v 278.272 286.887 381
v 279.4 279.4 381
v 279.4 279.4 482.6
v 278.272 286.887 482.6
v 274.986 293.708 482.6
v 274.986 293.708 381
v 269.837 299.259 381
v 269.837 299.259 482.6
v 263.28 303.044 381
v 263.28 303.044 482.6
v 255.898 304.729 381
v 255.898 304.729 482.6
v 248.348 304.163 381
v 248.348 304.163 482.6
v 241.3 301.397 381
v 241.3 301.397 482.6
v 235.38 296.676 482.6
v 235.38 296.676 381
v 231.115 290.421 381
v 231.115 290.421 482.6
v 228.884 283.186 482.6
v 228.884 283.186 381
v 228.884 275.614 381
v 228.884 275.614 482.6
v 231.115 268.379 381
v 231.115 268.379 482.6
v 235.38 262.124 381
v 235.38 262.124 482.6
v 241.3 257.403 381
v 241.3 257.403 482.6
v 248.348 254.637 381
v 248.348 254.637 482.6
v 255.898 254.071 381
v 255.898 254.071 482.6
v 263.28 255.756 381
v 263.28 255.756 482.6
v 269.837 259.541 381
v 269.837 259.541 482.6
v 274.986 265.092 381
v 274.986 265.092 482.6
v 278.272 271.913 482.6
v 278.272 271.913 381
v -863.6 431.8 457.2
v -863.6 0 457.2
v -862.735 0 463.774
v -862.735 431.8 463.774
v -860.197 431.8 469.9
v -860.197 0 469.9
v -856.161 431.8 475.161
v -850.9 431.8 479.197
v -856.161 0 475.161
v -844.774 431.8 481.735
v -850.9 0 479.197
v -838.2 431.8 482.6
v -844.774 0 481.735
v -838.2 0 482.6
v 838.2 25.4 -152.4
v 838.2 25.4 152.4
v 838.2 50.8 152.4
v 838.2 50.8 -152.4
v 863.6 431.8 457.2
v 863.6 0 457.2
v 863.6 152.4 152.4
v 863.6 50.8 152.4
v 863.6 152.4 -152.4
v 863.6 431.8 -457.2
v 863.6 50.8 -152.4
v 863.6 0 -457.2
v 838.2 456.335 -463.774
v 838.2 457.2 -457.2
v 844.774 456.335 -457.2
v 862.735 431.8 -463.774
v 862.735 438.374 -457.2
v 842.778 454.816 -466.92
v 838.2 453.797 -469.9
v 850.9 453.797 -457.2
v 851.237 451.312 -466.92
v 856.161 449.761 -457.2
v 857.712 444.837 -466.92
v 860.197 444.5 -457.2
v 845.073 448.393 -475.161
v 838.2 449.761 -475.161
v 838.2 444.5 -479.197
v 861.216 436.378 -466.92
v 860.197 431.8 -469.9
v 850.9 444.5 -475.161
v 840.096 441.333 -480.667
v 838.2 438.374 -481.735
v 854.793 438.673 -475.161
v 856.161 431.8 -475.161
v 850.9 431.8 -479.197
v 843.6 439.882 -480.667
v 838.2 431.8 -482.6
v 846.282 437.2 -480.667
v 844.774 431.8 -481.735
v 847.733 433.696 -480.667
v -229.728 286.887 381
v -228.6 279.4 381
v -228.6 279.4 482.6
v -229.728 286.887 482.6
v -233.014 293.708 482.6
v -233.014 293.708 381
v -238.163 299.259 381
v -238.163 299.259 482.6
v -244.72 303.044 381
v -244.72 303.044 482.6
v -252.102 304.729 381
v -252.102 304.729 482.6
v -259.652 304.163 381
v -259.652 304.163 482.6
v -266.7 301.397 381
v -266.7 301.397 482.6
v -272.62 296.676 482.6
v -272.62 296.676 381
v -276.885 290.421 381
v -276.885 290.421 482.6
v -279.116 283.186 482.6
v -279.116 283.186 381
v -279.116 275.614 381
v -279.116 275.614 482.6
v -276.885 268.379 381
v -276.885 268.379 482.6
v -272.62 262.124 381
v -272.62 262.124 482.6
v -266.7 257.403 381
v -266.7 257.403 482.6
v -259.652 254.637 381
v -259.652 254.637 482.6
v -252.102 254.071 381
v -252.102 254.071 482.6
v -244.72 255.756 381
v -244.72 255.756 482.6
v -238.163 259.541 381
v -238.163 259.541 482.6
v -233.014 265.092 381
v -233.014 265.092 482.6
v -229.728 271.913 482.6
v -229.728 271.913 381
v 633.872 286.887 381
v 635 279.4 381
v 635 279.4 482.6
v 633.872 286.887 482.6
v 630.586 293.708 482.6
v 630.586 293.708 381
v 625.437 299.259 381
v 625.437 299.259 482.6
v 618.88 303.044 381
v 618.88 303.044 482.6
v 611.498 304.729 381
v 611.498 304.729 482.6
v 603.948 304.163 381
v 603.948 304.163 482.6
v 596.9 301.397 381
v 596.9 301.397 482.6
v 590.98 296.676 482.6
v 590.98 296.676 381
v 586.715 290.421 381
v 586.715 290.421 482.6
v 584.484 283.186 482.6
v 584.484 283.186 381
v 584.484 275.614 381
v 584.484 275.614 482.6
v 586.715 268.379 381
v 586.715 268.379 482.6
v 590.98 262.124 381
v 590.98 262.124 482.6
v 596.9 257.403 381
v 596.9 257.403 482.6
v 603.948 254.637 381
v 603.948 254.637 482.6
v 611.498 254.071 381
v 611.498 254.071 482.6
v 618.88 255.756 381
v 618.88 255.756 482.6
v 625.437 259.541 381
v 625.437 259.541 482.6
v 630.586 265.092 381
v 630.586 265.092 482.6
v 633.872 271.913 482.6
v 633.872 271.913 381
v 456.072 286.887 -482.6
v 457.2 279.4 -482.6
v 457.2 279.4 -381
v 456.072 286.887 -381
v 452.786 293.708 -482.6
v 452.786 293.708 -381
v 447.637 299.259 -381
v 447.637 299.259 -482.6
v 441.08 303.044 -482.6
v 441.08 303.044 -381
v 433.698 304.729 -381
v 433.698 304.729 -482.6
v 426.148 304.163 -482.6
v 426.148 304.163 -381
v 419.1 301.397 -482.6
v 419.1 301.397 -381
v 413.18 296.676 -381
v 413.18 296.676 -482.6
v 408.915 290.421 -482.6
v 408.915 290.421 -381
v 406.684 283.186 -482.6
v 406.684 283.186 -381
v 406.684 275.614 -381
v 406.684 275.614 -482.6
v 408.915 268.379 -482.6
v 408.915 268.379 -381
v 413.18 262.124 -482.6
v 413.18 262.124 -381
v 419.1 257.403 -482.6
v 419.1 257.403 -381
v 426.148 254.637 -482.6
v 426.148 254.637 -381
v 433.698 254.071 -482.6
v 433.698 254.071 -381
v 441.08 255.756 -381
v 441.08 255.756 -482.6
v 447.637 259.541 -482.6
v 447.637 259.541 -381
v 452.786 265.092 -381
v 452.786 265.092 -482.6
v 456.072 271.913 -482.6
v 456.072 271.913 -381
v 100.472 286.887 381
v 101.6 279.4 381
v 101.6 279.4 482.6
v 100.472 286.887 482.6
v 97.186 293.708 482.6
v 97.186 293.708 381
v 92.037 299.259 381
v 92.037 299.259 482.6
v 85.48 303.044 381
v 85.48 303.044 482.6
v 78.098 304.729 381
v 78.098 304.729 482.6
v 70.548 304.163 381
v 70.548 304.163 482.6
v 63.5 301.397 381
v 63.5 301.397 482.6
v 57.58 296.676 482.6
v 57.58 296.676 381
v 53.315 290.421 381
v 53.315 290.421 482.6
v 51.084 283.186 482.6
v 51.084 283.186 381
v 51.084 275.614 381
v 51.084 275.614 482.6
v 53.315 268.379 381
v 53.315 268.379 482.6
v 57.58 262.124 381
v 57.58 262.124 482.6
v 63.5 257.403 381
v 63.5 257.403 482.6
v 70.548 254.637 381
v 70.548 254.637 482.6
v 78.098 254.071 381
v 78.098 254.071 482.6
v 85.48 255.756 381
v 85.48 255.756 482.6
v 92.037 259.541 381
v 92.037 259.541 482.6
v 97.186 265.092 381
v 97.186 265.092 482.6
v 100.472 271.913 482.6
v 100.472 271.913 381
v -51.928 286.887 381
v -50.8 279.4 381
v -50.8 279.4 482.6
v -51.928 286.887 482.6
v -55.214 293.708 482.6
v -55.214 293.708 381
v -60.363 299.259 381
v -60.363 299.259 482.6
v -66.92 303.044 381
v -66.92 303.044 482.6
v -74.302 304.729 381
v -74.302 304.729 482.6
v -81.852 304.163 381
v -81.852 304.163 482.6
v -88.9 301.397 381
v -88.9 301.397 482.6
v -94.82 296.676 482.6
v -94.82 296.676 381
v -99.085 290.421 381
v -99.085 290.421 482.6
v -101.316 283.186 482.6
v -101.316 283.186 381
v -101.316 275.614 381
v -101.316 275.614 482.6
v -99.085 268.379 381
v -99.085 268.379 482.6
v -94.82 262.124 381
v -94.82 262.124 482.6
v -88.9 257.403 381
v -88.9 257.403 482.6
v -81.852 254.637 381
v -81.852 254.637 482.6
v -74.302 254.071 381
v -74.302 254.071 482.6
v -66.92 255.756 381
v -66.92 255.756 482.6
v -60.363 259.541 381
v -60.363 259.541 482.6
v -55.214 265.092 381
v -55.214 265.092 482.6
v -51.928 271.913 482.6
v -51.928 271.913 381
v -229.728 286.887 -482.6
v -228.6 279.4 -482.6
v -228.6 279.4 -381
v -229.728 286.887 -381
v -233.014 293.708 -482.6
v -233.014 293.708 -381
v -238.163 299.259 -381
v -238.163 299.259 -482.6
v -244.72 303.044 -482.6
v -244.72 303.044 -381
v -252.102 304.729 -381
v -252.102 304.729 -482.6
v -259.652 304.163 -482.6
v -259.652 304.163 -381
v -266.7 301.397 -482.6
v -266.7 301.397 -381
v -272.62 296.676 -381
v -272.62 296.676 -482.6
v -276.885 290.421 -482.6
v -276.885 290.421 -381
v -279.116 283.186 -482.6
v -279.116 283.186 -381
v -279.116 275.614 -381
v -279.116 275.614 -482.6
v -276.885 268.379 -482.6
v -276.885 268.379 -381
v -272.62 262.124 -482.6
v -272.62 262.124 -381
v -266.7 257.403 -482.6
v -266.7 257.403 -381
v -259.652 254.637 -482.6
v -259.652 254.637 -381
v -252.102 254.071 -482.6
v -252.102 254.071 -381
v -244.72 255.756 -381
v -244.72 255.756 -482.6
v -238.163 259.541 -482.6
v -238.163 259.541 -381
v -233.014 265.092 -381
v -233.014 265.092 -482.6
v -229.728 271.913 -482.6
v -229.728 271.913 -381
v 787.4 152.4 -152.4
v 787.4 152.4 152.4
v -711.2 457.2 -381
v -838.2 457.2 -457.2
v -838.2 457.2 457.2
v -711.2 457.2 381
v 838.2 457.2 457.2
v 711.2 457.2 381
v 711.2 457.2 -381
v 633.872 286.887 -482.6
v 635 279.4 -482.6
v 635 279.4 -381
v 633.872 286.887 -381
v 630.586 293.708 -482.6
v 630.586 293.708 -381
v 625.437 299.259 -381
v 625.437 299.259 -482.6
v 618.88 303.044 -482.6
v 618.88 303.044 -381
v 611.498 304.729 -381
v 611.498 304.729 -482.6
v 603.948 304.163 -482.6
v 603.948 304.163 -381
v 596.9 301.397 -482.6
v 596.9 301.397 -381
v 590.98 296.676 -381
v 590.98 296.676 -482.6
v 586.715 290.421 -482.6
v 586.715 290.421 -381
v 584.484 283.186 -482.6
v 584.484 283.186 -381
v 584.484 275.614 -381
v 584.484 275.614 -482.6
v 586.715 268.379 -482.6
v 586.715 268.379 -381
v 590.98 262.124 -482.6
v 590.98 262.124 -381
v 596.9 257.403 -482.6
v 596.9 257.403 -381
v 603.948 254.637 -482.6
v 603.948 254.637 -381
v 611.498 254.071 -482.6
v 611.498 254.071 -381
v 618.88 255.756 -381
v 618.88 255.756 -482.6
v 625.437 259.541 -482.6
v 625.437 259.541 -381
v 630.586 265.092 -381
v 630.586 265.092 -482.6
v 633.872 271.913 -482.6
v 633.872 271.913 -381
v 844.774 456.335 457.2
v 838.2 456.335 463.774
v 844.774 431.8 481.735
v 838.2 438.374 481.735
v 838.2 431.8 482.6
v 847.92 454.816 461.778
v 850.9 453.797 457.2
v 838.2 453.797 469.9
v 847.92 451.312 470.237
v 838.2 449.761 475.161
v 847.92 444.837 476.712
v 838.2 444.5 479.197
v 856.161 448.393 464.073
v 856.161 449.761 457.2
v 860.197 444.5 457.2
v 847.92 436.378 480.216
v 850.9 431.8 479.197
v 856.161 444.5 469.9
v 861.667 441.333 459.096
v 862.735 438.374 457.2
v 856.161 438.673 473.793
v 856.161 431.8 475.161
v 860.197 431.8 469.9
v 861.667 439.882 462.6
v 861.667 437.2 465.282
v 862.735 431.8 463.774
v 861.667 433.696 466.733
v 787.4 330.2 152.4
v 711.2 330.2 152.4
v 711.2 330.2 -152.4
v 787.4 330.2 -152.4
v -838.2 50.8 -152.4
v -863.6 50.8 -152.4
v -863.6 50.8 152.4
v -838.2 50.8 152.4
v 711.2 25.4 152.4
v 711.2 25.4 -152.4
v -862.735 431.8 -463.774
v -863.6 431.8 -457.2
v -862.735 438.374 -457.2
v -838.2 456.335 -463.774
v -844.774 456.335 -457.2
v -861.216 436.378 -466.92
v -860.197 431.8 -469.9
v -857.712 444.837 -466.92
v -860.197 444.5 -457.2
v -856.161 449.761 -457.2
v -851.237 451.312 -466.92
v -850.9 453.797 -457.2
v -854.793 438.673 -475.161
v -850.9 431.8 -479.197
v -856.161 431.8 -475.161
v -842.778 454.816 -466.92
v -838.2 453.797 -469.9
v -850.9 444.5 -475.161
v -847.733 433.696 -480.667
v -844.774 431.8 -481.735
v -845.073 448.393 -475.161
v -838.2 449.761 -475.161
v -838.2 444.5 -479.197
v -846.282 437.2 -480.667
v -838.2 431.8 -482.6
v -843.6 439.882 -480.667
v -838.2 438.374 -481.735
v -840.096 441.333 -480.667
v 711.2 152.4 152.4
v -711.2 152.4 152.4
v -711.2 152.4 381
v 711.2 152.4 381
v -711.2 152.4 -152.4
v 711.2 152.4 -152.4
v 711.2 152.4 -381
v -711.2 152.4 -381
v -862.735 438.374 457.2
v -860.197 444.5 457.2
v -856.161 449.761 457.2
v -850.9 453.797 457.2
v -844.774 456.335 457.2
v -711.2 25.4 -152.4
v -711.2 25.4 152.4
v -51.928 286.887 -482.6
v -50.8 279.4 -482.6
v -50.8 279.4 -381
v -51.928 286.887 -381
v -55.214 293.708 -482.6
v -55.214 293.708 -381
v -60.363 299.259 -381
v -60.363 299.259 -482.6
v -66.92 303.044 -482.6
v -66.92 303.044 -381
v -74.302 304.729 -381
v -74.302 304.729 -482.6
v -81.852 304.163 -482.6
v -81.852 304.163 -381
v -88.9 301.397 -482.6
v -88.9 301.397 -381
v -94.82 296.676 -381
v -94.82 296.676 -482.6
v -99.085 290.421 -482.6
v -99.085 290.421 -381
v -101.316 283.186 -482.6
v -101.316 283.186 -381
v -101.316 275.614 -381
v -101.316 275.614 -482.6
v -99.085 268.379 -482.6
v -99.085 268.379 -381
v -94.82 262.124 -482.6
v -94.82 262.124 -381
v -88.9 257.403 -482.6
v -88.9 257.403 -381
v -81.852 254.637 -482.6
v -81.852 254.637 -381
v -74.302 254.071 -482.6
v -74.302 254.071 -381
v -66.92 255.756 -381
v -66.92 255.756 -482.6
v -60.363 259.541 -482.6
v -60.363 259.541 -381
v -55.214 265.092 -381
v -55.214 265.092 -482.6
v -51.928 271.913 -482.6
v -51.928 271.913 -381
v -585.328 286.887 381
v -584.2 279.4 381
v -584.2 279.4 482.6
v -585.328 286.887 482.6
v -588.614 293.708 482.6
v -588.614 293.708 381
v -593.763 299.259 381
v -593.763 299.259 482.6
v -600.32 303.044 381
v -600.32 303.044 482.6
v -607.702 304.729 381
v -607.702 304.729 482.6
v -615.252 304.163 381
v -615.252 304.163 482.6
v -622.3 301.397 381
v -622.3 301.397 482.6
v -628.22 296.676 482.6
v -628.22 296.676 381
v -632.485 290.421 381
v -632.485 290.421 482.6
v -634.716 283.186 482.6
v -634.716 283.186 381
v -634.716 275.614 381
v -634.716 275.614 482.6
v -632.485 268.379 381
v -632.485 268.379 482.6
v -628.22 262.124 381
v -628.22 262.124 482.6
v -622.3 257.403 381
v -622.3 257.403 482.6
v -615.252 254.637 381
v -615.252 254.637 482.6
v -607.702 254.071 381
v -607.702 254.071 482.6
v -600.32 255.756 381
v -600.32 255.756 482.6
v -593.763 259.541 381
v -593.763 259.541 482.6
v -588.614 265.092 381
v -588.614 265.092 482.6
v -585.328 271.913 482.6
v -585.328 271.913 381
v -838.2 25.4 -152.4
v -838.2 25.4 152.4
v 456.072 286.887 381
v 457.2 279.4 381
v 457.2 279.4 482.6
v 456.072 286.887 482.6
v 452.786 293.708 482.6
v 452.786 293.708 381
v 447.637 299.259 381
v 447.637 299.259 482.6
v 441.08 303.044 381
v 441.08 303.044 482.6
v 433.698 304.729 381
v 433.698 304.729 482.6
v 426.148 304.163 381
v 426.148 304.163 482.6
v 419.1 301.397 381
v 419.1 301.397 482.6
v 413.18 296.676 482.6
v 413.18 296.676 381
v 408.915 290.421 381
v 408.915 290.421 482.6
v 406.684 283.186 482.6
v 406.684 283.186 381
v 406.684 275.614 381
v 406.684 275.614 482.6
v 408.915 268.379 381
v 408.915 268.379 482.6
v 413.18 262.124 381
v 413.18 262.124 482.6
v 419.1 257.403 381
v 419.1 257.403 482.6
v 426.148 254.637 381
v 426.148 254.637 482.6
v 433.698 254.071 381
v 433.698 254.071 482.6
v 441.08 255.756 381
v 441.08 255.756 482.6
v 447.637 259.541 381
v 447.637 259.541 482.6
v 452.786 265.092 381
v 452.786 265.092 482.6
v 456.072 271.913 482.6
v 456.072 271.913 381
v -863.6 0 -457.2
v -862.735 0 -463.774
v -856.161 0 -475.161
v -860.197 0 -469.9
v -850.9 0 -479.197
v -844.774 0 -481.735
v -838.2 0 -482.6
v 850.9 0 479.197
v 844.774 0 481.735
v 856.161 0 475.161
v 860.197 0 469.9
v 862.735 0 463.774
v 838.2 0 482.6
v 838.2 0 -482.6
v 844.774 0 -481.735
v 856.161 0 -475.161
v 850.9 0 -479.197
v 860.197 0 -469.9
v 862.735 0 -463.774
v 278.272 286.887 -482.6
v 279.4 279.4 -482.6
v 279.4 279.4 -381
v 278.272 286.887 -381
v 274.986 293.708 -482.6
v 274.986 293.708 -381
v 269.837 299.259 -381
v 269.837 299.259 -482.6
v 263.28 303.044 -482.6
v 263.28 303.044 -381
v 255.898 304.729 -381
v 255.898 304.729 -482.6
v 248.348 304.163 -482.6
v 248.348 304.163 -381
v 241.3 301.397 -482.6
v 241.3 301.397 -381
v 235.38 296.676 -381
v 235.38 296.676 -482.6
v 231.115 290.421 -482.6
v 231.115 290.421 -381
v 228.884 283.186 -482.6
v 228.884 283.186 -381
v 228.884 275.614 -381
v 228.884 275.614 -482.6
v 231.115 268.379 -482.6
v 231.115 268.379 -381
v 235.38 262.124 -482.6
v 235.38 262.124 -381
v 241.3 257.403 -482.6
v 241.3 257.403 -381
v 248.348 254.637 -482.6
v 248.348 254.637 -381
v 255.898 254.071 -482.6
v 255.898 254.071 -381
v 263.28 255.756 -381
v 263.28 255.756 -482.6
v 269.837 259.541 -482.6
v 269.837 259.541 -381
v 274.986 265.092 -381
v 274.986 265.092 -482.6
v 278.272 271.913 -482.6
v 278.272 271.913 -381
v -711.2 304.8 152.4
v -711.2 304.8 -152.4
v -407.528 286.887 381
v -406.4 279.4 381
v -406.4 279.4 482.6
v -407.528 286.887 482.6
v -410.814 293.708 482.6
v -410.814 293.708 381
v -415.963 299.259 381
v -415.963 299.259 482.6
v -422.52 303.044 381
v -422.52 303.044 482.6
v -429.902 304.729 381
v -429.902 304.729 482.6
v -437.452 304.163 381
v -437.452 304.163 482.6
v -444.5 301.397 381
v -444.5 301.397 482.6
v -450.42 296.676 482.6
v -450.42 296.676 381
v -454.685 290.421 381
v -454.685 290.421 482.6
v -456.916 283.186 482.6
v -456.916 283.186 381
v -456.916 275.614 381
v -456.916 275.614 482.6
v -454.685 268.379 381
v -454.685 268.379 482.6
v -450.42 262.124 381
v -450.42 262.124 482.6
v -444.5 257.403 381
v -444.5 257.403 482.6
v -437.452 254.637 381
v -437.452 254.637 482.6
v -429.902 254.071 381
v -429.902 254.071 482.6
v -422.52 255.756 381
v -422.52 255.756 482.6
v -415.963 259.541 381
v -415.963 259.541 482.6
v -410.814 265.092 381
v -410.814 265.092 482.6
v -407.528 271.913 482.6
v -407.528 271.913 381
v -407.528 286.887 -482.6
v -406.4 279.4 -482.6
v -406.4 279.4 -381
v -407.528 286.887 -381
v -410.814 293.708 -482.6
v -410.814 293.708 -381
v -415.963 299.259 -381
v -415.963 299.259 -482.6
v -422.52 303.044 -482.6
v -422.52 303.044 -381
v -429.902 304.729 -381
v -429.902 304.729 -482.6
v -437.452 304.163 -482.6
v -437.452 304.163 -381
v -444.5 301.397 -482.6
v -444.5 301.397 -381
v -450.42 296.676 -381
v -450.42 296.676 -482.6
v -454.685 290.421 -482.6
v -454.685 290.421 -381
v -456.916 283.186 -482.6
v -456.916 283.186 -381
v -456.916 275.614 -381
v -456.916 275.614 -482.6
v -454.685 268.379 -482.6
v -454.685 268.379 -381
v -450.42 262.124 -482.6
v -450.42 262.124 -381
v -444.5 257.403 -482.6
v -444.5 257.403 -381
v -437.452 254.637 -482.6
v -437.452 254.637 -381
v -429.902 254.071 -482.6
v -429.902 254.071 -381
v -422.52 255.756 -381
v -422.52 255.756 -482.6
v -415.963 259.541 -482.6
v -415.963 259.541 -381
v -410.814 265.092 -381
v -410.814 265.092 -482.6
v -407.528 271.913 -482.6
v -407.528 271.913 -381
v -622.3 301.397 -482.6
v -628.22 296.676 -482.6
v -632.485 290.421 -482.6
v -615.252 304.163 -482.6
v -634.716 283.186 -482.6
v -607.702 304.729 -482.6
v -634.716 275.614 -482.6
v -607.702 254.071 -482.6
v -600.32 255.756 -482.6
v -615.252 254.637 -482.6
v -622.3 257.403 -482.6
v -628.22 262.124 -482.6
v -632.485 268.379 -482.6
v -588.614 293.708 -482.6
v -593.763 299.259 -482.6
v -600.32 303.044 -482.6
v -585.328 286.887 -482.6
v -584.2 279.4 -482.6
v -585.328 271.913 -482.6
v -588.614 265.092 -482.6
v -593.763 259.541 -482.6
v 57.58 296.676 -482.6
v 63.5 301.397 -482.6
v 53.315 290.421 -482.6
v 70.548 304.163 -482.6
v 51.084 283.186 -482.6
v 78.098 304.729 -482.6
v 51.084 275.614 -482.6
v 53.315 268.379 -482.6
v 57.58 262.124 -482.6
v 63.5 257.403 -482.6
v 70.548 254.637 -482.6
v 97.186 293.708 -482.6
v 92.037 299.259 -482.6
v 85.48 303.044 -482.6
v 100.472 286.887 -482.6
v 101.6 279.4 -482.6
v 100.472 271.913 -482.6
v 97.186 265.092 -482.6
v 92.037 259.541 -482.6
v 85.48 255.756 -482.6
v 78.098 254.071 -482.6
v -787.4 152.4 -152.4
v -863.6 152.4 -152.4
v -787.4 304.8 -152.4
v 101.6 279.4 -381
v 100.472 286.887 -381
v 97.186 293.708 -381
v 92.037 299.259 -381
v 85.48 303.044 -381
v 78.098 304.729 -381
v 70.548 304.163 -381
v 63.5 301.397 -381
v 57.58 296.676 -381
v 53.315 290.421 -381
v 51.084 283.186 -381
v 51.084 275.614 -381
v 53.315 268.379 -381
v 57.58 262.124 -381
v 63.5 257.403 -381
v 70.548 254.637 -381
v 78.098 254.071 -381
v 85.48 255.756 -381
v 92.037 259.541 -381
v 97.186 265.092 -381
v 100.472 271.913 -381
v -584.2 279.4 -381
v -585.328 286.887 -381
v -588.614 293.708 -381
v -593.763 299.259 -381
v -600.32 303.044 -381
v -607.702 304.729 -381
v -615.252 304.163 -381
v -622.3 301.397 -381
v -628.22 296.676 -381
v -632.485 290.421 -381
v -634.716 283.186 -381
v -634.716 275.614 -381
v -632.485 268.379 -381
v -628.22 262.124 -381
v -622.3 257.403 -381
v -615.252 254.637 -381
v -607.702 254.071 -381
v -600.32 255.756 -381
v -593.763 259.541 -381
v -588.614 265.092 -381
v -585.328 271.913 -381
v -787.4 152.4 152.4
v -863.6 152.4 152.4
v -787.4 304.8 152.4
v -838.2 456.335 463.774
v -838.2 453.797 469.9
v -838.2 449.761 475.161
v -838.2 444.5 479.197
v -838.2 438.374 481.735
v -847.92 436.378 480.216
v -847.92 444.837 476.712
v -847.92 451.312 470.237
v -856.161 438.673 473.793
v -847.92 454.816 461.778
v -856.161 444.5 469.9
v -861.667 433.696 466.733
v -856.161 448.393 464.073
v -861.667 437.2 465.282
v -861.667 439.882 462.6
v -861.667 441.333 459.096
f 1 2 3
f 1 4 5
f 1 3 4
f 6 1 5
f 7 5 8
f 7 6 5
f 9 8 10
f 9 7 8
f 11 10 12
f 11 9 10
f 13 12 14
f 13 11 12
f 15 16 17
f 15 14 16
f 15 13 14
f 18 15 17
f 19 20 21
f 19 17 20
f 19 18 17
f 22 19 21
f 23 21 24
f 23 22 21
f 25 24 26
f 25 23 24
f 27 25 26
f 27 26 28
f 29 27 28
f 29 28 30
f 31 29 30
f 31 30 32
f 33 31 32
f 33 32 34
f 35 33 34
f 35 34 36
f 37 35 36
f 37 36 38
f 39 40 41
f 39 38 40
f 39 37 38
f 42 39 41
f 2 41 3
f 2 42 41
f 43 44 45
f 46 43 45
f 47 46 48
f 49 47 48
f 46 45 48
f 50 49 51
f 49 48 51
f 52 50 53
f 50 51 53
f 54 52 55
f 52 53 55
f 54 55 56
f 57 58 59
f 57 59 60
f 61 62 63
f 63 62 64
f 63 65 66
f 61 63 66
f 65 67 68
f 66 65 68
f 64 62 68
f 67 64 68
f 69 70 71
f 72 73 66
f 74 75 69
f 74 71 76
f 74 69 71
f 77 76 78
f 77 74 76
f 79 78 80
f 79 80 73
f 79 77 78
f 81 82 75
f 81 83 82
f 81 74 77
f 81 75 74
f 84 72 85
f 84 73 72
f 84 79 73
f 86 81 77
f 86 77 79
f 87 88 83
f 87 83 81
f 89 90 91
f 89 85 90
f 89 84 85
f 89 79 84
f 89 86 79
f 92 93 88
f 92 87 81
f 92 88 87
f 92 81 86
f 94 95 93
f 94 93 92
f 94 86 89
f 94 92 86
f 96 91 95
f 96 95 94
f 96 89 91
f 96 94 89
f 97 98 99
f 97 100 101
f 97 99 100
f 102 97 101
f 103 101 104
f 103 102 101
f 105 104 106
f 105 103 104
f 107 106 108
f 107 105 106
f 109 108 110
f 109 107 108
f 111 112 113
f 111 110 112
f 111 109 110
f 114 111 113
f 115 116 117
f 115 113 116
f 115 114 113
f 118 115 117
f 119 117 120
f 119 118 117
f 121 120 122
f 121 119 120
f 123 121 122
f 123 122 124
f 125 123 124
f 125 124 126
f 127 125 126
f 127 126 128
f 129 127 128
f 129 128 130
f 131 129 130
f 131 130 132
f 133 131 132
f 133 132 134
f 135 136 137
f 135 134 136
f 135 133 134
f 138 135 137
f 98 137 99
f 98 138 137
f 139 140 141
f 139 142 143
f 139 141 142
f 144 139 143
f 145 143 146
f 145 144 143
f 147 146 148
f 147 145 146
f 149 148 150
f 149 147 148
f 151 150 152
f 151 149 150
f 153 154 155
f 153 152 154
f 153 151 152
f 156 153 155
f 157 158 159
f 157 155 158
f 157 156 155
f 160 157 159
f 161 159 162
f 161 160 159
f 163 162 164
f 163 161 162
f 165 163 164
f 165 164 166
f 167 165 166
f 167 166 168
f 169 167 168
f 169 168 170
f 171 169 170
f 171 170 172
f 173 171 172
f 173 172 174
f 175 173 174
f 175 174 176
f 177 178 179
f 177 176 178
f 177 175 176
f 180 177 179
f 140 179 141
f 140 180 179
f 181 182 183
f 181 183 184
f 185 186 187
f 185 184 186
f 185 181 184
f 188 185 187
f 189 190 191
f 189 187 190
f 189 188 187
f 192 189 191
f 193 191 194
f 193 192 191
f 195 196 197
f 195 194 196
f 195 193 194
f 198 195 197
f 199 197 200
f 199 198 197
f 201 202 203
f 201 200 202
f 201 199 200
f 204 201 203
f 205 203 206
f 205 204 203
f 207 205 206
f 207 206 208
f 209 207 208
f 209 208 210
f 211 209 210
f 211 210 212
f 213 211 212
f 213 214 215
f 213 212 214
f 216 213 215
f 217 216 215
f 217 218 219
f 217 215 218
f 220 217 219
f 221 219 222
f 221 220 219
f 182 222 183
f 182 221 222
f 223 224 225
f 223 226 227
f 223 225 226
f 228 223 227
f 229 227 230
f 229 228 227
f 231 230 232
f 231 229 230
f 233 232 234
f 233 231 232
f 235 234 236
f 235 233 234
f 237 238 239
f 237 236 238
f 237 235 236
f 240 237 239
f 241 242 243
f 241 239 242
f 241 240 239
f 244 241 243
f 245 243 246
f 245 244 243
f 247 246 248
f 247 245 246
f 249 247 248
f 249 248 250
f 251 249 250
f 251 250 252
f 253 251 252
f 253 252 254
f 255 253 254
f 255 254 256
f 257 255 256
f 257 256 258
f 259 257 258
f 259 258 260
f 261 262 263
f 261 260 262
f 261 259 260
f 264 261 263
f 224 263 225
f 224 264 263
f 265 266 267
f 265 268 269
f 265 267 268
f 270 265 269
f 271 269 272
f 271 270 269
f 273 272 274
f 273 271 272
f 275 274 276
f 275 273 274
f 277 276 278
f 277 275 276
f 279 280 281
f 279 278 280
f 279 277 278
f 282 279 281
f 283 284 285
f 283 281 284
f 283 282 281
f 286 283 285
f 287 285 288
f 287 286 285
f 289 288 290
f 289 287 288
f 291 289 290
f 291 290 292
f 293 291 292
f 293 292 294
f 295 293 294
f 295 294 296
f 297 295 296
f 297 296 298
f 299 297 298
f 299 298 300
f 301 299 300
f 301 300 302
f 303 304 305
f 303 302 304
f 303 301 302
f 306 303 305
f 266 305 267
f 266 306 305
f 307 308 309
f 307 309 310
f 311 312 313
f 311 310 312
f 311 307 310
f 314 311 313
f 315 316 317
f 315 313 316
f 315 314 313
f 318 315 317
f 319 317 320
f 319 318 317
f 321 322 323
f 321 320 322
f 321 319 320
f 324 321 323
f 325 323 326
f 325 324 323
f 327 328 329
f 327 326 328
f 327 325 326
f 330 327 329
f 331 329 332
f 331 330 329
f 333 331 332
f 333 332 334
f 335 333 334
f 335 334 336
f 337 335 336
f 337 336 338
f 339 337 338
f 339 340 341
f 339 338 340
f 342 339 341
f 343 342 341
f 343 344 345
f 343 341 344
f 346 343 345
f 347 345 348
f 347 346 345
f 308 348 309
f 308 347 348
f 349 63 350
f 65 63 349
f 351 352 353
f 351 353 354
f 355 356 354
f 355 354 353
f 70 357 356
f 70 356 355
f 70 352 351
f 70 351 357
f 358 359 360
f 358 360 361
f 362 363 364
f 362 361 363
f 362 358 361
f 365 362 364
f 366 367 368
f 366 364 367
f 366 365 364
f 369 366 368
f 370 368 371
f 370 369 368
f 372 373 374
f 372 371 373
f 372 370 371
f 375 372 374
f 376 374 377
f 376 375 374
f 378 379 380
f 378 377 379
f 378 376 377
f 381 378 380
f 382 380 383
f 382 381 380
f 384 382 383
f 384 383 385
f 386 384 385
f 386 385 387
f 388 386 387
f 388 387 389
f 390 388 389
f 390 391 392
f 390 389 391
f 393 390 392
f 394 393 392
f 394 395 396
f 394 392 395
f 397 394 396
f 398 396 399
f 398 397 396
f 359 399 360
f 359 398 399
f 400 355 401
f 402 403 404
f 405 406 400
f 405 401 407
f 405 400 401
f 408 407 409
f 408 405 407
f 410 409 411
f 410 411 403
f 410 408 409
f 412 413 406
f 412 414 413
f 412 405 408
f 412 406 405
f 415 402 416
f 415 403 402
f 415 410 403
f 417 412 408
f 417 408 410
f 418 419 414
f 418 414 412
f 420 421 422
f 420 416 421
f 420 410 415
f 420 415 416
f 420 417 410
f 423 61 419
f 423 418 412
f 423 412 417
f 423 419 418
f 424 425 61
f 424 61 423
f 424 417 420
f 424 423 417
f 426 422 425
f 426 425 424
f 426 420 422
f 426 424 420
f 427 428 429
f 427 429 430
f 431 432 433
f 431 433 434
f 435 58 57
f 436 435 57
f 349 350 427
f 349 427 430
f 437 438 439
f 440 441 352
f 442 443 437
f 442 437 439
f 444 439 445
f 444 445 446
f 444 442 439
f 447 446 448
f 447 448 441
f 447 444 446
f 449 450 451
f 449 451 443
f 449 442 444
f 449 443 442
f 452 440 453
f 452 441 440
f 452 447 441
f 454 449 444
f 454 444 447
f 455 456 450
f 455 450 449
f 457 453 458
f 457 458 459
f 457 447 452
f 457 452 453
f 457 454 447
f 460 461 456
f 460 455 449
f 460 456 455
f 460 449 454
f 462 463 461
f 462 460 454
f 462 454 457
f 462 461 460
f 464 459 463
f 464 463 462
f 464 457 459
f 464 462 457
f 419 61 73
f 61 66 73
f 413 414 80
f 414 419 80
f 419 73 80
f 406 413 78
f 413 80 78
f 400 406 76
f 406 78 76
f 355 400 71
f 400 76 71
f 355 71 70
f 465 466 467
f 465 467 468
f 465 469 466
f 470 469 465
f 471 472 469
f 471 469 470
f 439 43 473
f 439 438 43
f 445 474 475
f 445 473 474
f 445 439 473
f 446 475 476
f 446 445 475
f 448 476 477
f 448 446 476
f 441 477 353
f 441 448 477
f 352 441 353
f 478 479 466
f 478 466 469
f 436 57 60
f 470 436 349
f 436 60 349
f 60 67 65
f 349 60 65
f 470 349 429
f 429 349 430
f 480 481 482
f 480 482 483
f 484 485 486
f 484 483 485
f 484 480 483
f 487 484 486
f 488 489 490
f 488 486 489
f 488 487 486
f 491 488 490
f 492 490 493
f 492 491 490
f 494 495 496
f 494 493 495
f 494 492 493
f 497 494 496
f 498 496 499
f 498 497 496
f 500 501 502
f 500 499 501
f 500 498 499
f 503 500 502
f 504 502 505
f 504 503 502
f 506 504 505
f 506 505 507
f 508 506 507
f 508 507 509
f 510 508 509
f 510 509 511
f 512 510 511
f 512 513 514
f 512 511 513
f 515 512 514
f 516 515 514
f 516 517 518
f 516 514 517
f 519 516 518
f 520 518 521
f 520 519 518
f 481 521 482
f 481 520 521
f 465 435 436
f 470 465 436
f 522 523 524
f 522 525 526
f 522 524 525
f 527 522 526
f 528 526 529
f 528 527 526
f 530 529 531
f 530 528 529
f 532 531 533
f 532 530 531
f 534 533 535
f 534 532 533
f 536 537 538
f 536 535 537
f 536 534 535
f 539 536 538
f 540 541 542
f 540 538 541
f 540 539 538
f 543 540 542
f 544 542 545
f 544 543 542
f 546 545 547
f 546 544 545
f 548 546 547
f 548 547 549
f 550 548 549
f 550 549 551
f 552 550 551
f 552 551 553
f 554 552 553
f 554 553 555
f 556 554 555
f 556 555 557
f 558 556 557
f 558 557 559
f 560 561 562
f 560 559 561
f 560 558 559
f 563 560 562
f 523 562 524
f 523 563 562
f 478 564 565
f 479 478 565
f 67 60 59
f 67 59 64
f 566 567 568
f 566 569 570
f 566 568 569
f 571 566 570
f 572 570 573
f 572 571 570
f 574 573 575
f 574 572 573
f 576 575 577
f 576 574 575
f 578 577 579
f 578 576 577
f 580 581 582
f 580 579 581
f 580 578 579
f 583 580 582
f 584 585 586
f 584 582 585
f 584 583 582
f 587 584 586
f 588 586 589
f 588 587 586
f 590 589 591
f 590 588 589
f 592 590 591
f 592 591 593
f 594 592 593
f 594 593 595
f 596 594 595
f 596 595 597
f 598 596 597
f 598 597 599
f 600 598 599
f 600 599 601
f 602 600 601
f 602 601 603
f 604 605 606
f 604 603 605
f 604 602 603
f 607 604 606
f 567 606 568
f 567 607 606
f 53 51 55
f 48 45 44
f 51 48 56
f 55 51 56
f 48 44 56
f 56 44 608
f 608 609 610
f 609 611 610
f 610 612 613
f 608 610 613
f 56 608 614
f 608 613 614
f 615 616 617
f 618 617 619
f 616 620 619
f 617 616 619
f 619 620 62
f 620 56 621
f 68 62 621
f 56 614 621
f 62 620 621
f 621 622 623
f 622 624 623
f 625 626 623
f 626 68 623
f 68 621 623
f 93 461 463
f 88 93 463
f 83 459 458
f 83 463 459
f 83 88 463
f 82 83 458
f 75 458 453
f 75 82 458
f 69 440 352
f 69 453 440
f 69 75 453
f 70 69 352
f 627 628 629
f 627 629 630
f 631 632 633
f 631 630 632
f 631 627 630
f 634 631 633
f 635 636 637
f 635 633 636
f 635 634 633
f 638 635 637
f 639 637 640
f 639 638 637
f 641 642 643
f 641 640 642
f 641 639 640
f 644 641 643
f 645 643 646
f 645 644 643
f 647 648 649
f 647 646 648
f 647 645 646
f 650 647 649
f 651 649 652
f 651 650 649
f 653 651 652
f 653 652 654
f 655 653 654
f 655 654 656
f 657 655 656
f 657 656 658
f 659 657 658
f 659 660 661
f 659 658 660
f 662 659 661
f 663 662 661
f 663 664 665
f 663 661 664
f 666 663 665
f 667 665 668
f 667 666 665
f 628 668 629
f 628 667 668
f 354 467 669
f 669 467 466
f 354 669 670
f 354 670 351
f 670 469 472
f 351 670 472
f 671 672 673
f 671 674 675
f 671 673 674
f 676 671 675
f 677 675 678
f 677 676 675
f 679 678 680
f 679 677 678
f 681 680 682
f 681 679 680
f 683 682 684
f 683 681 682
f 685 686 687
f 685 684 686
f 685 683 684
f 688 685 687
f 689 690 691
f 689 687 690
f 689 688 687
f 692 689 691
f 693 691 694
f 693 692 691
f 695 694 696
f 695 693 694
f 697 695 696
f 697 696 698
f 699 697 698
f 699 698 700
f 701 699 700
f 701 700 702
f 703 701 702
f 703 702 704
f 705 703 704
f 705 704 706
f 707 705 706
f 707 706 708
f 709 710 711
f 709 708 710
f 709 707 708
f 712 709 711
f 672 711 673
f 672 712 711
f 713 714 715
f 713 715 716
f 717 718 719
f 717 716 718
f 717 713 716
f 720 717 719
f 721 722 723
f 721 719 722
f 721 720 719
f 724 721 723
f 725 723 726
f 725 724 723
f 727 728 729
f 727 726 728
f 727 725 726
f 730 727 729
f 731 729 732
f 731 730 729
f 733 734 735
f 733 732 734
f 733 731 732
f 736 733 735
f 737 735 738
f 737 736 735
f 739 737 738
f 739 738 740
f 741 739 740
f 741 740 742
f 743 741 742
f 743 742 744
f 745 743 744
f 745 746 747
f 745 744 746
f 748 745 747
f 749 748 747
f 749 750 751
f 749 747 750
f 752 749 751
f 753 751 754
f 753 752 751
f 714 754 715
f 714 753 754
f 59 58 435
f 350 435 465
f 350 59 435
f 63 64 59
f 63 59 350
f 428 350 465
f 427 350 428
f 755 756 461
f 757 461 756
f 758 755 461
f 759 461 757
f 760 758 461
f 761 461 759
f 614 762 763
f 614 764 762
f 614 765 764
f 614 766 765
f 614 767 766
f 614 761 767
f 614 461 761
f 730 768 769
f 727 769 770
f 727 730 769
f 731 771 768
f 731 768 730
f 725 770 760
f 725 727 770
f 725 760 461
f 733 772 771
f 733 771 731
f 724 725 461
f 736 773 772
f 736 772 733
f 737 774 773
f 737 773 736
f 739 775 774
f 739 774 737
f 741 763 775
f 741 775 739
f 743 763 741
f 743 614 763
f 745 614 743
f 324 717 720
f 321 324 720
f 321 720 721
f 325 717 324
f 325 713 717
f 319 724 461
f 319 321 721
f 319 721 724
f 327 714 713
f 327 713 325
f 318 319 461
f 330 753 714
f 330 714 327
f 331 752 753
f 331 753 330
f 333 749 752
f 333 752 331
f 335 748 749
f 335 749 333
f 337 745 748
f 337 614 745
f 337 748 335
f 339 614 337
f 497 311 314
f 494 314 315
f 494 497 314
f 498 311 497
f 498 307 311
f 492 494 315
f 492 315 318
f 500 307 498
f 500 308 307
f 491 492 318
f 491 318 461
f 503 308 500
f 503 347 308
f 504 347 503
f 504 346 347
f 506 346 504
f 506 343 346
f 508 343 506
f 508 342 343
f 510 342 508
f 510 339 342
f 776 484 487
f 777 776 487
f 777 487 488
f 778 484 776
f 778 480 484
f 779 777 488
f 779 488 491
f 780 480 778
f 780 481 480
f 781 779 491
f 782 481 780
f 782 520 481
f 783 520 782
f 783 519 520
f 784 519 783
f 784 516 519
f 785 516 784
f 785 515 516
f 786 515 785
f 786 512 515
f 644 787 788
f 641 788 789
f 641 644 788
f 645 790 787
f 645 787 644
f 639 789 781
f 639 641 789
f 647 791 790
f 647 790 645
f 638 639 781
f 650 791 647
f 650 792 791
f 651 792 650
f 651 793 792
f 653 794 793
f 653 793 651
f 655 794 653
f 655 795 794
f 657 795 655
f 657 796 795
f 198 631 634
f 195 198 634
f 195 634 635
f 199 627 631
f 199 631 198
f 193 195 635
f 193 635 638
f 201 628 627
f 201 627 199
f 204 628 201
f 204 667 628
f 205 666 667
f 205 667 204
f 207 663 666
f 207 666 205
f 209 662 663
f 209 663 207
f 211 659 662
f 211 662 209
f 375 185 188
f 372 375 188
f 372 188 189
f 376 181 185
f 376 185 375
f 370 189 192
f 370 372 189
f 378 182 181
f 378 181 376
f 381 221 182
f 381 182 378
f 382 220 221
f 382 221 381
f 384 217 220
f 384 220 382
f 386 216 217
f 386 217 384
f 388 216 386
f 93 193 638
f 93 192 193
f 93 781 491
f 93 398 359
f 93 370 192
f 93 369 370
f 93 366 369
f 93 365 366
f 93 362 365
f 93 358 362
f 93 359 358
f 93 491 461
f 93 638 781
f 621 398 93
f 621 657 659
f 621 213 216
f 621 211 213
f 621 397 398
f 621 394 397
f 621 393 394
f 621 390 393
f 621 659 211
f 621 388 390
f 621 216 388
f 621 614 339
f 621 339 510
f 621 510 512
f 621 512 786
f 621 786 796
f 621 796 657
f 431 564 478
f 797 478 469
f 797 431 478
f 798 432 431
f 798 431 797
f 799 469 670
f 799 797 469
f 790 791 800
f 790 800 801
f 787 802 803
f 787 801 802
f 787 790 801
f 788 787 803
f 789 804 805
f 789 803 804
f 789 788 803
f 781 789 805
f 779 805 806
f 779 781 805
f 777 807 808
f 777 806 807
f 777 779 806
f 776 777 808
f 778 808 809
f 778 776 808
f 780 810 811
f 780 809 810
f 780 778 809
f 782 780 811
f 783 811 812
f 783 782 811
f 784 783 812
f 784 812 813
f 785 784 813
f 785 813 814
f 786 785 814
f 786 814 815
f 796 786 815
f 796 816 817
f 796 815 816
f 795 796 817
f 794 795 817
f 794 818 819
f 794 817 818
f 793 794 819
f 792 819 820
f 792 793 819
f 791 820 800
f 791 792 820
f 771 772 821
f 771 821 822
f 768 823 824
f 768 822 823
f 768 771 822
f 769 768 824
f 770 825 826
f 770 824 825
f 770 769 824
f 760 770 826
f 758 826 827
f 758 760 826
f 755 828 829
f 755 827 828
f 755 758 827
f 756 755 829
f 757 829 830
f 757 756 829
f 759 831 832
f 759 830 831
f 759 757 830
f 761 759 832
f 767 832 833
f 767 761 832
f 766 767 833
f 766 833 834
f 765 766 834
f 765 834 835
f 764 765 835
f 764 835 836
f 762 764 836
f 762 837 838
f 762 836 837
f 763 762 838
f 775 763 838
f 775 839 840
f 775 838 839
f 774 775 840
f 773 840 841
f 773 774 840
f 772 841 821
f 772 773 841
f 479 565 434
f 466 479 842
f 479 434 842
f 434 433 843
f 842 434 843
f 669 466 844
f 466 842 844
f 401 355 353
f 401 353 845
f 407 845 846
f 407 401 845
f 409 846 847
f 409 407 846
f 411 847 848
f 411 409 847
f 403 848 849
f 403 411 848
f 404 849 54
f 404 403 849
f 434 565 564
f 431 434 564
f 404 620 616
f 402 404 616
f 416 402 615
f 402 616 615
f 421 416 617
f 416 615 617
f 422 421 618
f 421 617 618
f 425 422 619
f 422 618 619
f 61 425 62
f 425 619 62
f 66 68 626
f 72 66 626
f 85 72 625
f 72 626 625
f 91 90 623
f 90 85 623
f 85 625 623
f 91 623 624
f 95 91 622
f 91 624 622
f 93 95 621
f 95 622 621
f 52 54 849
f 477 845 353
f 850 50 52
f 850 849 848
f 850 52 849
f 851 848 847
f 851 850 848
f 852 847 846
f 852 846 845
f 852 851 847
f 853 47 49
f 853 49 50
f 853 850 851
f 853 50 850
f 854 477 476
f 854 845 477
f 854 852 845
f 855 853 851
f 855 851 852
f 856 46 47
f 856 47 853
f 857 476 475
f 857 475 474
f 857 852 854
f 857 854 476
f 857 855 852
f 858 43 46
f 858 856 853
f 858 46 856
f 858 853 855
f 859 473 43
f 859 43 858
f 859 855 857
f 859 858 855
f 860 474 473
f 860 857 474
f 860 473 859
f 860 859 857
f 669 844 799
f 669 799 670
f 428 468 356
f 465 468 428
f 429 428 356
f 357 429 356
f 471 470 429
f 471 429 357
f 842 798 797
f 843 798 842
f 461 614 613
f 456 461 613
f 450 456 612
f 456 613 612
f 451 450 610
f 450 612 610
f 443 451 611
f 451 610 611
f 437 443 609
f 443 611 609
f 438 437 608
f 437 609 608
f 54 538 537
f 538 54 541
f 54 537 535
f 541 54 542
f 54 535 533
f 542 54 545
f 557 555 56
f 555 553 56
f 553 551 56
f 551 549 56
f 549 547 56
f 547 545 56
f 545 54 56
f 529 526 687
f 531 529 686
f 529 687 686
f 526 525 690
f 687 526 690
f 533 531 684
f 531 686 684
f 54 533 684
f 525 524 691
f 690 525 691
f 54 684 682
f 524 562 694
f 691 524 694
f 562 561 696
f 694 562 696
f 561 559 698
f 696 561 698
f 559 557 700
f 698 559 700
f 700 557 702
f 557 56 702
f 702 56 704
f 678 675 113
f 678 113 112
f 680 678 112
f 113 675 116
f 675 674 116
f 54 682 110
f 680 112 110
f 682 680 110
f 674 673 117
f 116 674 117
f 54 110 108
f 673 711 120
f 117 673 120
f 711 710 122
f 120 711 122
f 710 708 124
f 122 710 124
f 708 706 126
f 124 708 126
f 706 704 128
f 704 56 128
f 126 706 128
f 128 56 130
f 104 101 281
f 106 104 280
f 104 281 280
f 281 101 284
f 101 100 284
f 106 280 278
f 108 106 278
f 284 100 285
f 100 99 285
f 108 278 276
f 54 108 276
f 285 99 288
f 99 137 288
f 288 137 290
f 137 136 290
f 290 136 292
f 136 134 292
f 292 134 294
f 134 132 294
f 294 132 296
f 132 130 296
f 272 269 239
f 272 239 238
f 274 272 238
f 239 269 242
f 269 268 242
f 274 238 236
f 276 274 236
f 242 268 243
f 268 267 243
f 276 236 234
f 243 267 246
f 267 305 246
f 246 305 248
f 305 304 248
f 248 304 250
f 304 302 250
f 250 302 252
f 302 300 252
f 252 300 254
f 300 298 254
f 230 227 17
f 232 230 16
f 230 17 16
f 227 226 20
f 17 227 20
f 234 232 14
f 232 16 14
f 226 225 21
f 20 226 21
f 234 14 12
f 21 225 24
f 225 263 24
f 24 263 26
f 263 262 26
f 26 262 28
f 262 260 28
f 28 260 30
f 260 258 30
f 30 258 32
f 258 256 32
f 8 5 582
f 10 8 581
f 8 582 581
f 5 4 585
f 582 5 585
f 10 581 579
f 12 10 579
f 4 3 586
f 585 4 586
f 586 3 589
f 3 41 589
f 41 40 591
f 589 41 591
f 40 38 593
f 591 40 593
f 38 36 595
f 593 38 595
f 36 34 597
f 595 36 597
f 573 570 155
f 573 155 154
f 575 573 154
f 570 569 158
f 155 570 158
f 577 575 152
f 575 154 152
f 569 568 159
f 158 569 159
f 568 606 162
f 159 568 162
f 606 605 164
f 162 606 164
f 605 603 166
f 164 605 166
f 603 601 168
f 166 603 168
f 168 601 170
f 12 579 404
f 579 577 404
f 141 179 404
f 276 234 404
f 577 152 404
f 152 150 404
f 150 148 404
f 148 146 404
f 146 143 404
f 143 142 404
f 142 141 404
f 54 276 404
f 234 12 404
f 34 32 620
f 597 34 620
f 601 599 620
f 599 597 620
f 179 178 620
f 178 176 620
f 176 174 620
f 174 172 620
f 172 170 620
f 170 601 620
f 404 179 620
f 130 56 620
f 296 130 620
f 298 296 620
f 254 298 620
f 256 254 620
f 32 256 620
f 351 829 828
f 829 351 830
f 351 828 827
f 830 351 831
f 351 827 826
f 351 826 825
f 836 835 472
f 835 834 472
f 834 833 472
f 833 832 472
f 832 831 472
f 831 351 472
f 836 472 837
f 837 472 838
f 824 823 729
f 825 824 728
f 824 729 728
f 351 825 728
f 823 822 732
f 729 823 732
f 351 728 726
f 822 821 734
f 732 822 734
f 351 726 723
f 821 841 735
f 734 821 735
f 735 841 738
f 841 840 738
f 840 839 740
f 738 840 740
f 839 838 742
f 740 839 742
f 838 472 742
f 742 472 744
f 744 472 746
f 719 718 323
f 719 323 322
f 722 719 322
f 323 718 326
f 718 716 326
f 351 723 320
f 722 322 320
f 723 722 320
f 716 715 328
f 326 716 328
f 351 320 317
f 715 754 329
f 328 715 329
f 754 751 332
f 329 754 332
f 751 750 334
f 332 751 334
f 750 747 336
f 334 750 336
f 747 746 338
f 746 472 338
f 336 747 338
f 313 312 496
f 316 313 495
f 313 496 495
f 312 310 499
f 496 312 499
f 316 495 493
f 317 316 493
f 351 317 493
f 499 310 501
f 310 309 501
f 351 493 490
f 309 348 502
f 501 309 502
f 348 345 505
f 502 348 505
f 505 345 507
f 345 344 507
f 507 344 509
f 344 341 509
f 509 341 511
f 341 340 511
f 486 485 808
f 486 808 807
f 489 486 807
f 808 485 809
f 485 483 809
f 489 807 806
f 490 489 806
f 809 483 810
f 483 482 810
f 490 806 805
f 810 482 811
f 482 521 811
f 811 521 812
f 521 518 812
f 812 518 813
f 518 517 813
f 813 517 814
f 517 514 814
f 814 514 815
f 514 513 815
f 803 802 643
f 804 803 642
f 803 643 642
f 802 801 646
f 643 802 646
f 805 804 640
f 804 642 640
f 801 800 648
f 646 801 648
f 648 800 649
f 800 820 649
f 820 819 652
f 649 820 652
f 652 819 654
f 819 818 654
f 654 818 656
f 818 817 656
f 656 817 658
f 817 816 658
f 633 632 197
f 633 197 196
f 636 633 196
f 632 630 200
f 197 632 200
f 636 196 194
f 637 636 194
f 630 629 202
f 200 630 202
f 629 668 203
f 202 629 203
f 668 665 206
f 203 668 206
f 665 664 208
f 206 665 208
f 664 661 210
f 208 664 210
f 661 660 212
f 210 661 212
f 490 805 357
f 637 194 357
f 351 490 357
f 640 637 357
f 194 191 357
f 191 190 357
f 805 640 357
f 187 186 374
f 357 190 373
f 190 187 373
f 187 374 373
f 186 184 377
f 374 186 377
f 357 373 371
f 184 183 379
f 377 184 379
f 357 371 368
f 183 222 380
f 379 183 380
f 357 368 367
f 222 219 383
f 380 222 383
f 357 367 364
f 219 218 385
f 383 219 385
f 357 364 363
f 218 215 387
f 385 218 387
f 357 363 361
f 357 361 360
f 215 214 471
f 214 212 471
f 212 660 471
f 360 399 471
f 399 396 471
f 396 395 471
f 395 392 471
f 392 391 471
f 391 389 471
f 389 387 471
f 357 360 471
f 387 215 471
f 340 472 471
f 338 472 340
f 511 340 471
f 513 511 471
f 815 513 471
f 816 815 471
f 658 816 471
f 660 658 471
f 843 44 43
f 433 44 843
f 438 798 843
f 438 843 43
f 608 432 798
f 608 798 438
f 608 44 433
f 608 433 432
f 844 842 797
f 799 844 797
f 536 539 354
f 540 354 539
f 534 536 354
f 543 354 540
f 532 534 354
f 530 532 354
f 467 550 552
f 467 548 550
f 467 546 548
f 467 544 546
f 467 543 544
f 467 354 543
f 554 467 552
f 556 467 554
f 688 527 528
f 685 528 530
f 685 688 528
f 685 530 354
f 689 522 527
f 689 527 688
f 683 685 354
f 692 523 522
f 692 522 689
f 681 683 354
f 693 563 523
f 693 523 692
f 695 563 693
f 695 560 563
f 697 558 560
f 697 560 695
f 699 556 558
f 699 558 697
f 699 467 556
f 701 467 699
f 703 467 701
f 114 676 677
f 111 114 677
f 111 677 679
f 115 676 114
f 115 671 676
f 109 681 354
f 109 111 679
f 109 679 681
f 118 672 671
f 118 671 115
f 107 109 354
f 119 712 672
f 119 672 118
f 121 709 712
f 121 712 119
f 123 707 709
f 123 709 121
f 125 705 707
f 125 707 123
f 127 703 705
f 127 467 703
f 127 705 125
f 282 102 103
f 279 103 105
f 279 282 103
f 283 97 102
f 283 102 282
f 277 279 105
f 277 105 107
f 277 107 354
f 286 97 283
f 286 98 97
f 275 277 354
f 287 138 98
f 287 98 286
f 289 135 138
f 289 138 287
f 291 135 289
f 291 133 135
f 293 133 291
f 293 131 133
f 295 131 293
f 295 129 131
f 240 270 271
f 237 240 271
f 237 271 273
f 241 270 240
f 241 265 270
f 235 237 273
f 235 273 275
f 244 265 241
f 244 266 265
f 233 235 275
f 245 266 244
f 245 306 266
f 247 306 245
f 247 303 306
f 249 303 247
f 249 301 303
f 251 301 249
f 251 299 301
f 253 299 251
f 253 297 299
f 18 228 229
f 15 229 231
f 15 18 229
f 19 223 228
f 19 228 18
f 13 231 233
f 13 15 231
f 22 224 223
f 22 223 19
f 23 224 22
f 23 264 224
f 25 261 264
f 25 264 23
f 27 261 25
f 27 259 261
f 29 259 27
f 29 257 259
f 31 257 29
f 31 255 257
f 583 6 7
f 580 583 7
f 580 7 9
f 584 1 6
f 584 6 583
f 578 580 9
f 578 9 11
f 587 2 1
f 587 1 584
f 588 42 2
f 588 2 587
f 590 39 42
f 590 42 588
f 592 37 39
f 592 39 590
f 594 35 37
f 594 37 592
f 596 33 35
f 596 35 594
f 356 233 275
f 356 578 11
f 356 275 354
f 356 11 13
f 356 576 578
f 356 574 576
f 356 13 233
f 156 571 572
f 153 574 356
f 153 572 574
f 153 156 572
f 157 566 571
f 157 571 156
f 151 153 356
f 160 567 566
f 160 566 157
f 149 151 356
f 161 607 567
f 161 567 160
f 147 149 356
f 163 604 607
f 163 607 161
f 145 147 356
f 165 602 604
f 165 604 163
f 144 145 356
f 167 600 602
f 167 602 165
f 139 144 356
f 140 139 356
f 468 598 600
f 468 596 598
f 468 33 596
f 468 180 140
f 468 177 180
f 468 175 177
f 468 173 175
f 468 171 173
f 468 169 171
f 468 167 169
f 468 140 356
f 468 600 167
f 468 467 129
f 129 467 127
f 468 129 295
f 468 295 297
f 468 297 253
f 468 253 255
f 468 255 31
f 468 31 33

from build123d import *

# Parameters (mm, degrees)
SKETCH1_W               = 1727.2
SKETCH1_H               = 965.2
SKETCH1_W_2             = 1422.4
SKETCH1_H_2             = 762
BOSS_EXTRUDE1_DEPTH     = 457.2
SKETCH2_W               = 1422.4
SKETCH2_H               = 762
BOSS_EXTRUDE2_DEPTH     = 152.4
CUT_EXTRUDE1_DEPTH      = 1374.480192795
CUT_EXTRUDE1_DEPTH_BACK = 1374.480192795
SKETCH4_R               = 25.4
SKETCH7_W               = 304.8
SKETCH7_H               = 127
CUT_EXTRUDE2_DEPTH      = 127
SKETCH8_W               = 76.2
SKETCH8_H               = 304.8
CUT_EXTRUDE3_DEPTH      = 304.8
SKETCH9_W               = 25.4
SKETCH9_H               = 304.8
BOSS_EXTRUDE3_DEPTH     = 25.4
SKETCH11_W              = 304.8
SKETCH11_H              = 127
CUT_EXTRUDE5_DEPTH      = 127
SKETCH13_W              = 25.4
SKETCH13_H              = 304.8
BOSS_EXTRUDE4_DEPTH     = 25.4
SKETCH14_W              = 76.2
SKETCH14_H              = 304.8
CUT_EXTRUDE7_DEPTH      = 279.4
FILLET1_R               = 25.4
FILLET2_R               = 25.4


with BuildPart() as part:
    # Sketch1 → Boss-Extrude1 (new body)
    with BuildSketch(Plane(origin=(0, 0, 0), x_dir=(1, 0, 0), z_dir=(0, 1, 0))):
        Rectangle(SKETCH1_W, SKETCH1_H)
        Rectangle(SKETCH1_W_2, SKETCH1_H_2, mode=Mode.SUBTRACT)
    extrude(amount=BOSS_EXTRUDE1_DEPTH)

    # Sketch2 → Boss-Extrude2 (add)
    with BuildSketch(Plane(origin=(0, 0, 0), x_dir=(1, 0, 0), z_dir=(0, 1, 0))):
        Rectangle(SKETCH2_W, SKETCH2_H)
    extrude(amount=BOSS_EXTRUDE2_DEPTH)

    # Sketch4 → Cut-Extrude1 (cut, two sides: drawn at the far end of the back side and taken through both)
    with BuildSketch(Plane.XY.offset(482.6).offset(-CUT_EXTRUDE1_DEPTH_BACK)):
        with Locations((-609.6, 279.4)):
            Circle(SKETCH4_R)
        with Locations((-431.8, 279.4)):
            Circle(SKETCH4_R)
        with Locations((-254, 279.4)):
            Circle(SKETCH4_R)
        with Locations((-76.2, 279.4)):
            Circle(SKETCH4_R)
        with Locations((76.2, 279.4)):
            Circle(SKETCH4_R)
        with Locations((254, 279.4)):
            Circle(SKETCH4_R)
        with Locations((431.8, 279.4)):
            Circle(SKETCH4_R)
        with Locations((609.6, 279.4)):
            Circle(SKETCH4_R)
    extrude(amount=CUT_EXTRUDE1_DEPTH + CUT_EXTRUDE1_DEPTH_BACK, mode=Mode.SUBTRACT)

    # Sketch7 → Cut-Extrude2 (cut)
    with BuildSketch(Plane(origin=(863.6, 0, 0), x_dir=(0, 0, -1), z_dir=(1, 0, 0))):
        with Locations((0, 88.9)):
            Rectangle(SKETCH7_W, SKETCH7_H)
    extrude(amount=-CUT_EXTRUDE2_DEPTH, mode=Mode.SUBTRACT)

    # Sketch8 → Cut-Extrude3 (cut)
    with BuildSketch(Plane(origin=(0, 25.4, 0), x_dir=(1, 0, 0), z_dir=(0, 1, 0))):
        with Locations((749.3, 0)):
            Rectangle(SKETCH8_W, SKETCH8_H)
    extrude(amount=CUT_EXTRUDE3_DEPTH, mode=Mode.SUBTRACT)

    # Sketch9 → Boss-Extrude3 (add)
    with BuildSketch(Plane(origin=(0, 25.4, 0), x_dir=(1, 0, 0), z_dir=(0, 1, 0))):
        with Locations((850.9, 0)):
            Rectangle(SKETCH9_W, SKETCH9_H)
    extrude(amount=BOSS_EXTRUDE3_DEPTH)

    # Sketch11 → Cut-Extrude5 (cut)
    with BuildSketch(Plane.ZY.offset(863.6)):
        with Locations((0, 88.9)):
            Rectangle(SKETCH11_W, SKETCH11_H)
    extrude(amount=-CUT_EXTRUDE5_DEPTH, mode=Mode.SUBTRACT)

    # Sketch13 → Boss-Extrude4 (add)
    with BuildSketch(Plane(origin=(0, 25.4, 0), x_dir=(1, 0, 0), z_dir=(0, 1, 0))):
        with Locations((-850.9, 0)):
            Rectangle(SKETCH13_W, SKETCH13_H)
    extrude(amount=BOSS_EXTRUDE4_DEPTH)

    # Sketch14 → Cut-Extrude7 (cut)
    with BuildSketch(Plane(origin=(0, 25.4, 0), x_dir=(1, 0, 0), z_dir=(0, 1, 0))):
        with Locations((-749.3, 0)):
            Rectangle(SKETCH14_W, SKETCH14_H)
    extrude(amount=CUT_EXTRUDE7_DEPTH, mode=Mode.SUBTRACT)

    # Fillet1
    fillet1_edges = [part.edges().sort_by_distance(p)[0] for p in [
        (863.6, 457.2, 0),
        (0, 457.2, -482.6),
        (-863.6, 457.2, 0),
        (0, 457.2, 482.6),
    ]]
    fillet(fillet1_edges, radius=FILLET1_R)

    # Fillet2
    # the kernel refuses this fillet: 25.4 mm, written as the material it takes off along each edge
    with BuildSketch(Plane(origin=(-838.2, 431.8, 457.2), x_dir=(0, 0, 1), z_dir=(-1, 0, 0))) as fillet2_piece_1_section:
        Polygon((0, 0), (FILLET2_R * 1.02, 0), (FILLET2_R * 1.02, FILLET2_R * 1.02), (0, FILLET2_R * 1.02), align=None)
    fillet2_piece_1 = extrude(amount=FILLET2_R * 1.02, mode=Mode.PRIVATE)
    fillet2_piece_1 = fillet2_piece_1 - Plane(origin=(-838.2, 431.8, 457.2), x_dir=(0, -0.7071067811865475, -0.7071067811865475), z_dir=(-1, 0, 0)) * Sphere(FILLET2_R, mode=Mode.PRIVATE)
    add(fillet2_piece_1, mode=Mode.SUBTRACT)
    with BuildSketch(Plane(origin=(-838.2, 431.8, -457.2), x_dir=(-1, 0, 0), z_dir=(0, 0, -1))) as fillet2_piece_2_section:
        Polygon((0, 0), (FILLET2_R * 1.02, 0), (FILLET2_R * 1.02, FILLET2_R * 1.02), (0, FILLET2_R * 1.02), align=None)
    fillet2_piece_2 = extrude(amount=FILLET2_R * 1.02, mode=Mode.PRIVATE)
    fillet2_piece_2 = fillet2_piece_2 - Plane(origin=(-838.2, 431.8, -457.2), x_dir=(0.7071067811865475, -0.7071067811865475, 0), z_dir=(0, 0, -1)) * Sphere(FILLET2_R, mode=Mode.PRIVATE)
    add(fillet2_piece_2, mode=Mode.SUBTRACT)
    with BuildSketch(Plane(origin=(838.2, 431.8, 457.2), x_dir=(0, 0, 1), z_dir=(1, 0, 0))) as fillet2_piece_3_section:
        Polygon((0, 0), (FILLET2_R * 1.02, 0), (FILLET2_R * 1.02, -FILLET2_R * 1.02), (0, -FILLET2_R * 1.02), align=None)
    fillet2_piece_3 = extrude(amount=FILLET2_R * 1.02, mode=Mode.PRIVATE)
    fillet2_piece_3 = fillet2_piece_3 - Plane(origin=(838.2, 431.8, 457.2), x_dir=(0, -0.7071067811865475, -0.7071067811865475), z_dir=(1, 0, 0)) * Sphere(FILLET2_R, mode=Mode.PRIVATE)
    add(fillet2_piece_3, mode=Mode.SUBTRACT)
    with BuildSketch(Plane(origin=(838.2, 431.8, -457.2), x_dir=(1, 0, 0), z_dir=(0, 0, -1))) as fillet2_piece_4_section:
        Polygon((0, 0), (FILLET2_R * 1.02, 0), (FILLET2_R * 1.02, -FILLET2_R * 1.02), (0, -FILLET2_R * 1.02), align=None)
    fillet2_piece_4 = extrude(amount=FILLET2_R * 1.02, mode=Mode.PRIVATE)
    fillet2_piece_4 = fillet2_piece_4 - Plane(origin=(838.2, 431.8, -457.2), x_dir=(-0.7071067811865475, -0.7071067811865475, 0), z_dir=(0, 0, -1)) * Sphere(FILLET2_R, mode=Mode.PRIVATE)
    add(fillet2_piece_4, mode=Mode.SUBTRACT)
    with BuildSketch(Plane(origin=(863.6, -63.5, -482.6), x_dir=(-1, 0, 0), z_dir=(0, 1, 0)), Plane(origin=(863.6, -63.5, 482.6), x_dir=(0, 0, -1), z_dir=(0, 1, 0))) as fillet2_piece_5:
        with BuildLine():
            CenterArc((FILLET2_R, FILLET2_R), FILLET2_R, 180, 90)
            Line((0, FILLET2_R), (0, 0))
            Line((0, 0), (FILLET2_R, 0))
        make_face()
    extrude(amount=495.3, mode=Mode.SUBTRACT)
    with BuildSketch(Plane(origin=(-863.6, -63.5, -482.6), x_dir=(1, 0, 0), z_dir=(0, 1, 0)), Plane(origin=(-863.6, -63.5, 482.6), x_dir=(0, 0, -1), z_dir=(0, 1, 0))) as fillet2_piece_6:
        with BuildLine():
            CenterArc((FILLET2_R, -FILLET2_R), FILLET2_R, 90, 90)
            Line((0, -FILLET2_R), (0, 0))
            Line((0, 0), (FILLET2_R, 0))
        make_face()
    extrude(amount=495.3, mode=Mode.SUBTRACT)


solid = part.part
